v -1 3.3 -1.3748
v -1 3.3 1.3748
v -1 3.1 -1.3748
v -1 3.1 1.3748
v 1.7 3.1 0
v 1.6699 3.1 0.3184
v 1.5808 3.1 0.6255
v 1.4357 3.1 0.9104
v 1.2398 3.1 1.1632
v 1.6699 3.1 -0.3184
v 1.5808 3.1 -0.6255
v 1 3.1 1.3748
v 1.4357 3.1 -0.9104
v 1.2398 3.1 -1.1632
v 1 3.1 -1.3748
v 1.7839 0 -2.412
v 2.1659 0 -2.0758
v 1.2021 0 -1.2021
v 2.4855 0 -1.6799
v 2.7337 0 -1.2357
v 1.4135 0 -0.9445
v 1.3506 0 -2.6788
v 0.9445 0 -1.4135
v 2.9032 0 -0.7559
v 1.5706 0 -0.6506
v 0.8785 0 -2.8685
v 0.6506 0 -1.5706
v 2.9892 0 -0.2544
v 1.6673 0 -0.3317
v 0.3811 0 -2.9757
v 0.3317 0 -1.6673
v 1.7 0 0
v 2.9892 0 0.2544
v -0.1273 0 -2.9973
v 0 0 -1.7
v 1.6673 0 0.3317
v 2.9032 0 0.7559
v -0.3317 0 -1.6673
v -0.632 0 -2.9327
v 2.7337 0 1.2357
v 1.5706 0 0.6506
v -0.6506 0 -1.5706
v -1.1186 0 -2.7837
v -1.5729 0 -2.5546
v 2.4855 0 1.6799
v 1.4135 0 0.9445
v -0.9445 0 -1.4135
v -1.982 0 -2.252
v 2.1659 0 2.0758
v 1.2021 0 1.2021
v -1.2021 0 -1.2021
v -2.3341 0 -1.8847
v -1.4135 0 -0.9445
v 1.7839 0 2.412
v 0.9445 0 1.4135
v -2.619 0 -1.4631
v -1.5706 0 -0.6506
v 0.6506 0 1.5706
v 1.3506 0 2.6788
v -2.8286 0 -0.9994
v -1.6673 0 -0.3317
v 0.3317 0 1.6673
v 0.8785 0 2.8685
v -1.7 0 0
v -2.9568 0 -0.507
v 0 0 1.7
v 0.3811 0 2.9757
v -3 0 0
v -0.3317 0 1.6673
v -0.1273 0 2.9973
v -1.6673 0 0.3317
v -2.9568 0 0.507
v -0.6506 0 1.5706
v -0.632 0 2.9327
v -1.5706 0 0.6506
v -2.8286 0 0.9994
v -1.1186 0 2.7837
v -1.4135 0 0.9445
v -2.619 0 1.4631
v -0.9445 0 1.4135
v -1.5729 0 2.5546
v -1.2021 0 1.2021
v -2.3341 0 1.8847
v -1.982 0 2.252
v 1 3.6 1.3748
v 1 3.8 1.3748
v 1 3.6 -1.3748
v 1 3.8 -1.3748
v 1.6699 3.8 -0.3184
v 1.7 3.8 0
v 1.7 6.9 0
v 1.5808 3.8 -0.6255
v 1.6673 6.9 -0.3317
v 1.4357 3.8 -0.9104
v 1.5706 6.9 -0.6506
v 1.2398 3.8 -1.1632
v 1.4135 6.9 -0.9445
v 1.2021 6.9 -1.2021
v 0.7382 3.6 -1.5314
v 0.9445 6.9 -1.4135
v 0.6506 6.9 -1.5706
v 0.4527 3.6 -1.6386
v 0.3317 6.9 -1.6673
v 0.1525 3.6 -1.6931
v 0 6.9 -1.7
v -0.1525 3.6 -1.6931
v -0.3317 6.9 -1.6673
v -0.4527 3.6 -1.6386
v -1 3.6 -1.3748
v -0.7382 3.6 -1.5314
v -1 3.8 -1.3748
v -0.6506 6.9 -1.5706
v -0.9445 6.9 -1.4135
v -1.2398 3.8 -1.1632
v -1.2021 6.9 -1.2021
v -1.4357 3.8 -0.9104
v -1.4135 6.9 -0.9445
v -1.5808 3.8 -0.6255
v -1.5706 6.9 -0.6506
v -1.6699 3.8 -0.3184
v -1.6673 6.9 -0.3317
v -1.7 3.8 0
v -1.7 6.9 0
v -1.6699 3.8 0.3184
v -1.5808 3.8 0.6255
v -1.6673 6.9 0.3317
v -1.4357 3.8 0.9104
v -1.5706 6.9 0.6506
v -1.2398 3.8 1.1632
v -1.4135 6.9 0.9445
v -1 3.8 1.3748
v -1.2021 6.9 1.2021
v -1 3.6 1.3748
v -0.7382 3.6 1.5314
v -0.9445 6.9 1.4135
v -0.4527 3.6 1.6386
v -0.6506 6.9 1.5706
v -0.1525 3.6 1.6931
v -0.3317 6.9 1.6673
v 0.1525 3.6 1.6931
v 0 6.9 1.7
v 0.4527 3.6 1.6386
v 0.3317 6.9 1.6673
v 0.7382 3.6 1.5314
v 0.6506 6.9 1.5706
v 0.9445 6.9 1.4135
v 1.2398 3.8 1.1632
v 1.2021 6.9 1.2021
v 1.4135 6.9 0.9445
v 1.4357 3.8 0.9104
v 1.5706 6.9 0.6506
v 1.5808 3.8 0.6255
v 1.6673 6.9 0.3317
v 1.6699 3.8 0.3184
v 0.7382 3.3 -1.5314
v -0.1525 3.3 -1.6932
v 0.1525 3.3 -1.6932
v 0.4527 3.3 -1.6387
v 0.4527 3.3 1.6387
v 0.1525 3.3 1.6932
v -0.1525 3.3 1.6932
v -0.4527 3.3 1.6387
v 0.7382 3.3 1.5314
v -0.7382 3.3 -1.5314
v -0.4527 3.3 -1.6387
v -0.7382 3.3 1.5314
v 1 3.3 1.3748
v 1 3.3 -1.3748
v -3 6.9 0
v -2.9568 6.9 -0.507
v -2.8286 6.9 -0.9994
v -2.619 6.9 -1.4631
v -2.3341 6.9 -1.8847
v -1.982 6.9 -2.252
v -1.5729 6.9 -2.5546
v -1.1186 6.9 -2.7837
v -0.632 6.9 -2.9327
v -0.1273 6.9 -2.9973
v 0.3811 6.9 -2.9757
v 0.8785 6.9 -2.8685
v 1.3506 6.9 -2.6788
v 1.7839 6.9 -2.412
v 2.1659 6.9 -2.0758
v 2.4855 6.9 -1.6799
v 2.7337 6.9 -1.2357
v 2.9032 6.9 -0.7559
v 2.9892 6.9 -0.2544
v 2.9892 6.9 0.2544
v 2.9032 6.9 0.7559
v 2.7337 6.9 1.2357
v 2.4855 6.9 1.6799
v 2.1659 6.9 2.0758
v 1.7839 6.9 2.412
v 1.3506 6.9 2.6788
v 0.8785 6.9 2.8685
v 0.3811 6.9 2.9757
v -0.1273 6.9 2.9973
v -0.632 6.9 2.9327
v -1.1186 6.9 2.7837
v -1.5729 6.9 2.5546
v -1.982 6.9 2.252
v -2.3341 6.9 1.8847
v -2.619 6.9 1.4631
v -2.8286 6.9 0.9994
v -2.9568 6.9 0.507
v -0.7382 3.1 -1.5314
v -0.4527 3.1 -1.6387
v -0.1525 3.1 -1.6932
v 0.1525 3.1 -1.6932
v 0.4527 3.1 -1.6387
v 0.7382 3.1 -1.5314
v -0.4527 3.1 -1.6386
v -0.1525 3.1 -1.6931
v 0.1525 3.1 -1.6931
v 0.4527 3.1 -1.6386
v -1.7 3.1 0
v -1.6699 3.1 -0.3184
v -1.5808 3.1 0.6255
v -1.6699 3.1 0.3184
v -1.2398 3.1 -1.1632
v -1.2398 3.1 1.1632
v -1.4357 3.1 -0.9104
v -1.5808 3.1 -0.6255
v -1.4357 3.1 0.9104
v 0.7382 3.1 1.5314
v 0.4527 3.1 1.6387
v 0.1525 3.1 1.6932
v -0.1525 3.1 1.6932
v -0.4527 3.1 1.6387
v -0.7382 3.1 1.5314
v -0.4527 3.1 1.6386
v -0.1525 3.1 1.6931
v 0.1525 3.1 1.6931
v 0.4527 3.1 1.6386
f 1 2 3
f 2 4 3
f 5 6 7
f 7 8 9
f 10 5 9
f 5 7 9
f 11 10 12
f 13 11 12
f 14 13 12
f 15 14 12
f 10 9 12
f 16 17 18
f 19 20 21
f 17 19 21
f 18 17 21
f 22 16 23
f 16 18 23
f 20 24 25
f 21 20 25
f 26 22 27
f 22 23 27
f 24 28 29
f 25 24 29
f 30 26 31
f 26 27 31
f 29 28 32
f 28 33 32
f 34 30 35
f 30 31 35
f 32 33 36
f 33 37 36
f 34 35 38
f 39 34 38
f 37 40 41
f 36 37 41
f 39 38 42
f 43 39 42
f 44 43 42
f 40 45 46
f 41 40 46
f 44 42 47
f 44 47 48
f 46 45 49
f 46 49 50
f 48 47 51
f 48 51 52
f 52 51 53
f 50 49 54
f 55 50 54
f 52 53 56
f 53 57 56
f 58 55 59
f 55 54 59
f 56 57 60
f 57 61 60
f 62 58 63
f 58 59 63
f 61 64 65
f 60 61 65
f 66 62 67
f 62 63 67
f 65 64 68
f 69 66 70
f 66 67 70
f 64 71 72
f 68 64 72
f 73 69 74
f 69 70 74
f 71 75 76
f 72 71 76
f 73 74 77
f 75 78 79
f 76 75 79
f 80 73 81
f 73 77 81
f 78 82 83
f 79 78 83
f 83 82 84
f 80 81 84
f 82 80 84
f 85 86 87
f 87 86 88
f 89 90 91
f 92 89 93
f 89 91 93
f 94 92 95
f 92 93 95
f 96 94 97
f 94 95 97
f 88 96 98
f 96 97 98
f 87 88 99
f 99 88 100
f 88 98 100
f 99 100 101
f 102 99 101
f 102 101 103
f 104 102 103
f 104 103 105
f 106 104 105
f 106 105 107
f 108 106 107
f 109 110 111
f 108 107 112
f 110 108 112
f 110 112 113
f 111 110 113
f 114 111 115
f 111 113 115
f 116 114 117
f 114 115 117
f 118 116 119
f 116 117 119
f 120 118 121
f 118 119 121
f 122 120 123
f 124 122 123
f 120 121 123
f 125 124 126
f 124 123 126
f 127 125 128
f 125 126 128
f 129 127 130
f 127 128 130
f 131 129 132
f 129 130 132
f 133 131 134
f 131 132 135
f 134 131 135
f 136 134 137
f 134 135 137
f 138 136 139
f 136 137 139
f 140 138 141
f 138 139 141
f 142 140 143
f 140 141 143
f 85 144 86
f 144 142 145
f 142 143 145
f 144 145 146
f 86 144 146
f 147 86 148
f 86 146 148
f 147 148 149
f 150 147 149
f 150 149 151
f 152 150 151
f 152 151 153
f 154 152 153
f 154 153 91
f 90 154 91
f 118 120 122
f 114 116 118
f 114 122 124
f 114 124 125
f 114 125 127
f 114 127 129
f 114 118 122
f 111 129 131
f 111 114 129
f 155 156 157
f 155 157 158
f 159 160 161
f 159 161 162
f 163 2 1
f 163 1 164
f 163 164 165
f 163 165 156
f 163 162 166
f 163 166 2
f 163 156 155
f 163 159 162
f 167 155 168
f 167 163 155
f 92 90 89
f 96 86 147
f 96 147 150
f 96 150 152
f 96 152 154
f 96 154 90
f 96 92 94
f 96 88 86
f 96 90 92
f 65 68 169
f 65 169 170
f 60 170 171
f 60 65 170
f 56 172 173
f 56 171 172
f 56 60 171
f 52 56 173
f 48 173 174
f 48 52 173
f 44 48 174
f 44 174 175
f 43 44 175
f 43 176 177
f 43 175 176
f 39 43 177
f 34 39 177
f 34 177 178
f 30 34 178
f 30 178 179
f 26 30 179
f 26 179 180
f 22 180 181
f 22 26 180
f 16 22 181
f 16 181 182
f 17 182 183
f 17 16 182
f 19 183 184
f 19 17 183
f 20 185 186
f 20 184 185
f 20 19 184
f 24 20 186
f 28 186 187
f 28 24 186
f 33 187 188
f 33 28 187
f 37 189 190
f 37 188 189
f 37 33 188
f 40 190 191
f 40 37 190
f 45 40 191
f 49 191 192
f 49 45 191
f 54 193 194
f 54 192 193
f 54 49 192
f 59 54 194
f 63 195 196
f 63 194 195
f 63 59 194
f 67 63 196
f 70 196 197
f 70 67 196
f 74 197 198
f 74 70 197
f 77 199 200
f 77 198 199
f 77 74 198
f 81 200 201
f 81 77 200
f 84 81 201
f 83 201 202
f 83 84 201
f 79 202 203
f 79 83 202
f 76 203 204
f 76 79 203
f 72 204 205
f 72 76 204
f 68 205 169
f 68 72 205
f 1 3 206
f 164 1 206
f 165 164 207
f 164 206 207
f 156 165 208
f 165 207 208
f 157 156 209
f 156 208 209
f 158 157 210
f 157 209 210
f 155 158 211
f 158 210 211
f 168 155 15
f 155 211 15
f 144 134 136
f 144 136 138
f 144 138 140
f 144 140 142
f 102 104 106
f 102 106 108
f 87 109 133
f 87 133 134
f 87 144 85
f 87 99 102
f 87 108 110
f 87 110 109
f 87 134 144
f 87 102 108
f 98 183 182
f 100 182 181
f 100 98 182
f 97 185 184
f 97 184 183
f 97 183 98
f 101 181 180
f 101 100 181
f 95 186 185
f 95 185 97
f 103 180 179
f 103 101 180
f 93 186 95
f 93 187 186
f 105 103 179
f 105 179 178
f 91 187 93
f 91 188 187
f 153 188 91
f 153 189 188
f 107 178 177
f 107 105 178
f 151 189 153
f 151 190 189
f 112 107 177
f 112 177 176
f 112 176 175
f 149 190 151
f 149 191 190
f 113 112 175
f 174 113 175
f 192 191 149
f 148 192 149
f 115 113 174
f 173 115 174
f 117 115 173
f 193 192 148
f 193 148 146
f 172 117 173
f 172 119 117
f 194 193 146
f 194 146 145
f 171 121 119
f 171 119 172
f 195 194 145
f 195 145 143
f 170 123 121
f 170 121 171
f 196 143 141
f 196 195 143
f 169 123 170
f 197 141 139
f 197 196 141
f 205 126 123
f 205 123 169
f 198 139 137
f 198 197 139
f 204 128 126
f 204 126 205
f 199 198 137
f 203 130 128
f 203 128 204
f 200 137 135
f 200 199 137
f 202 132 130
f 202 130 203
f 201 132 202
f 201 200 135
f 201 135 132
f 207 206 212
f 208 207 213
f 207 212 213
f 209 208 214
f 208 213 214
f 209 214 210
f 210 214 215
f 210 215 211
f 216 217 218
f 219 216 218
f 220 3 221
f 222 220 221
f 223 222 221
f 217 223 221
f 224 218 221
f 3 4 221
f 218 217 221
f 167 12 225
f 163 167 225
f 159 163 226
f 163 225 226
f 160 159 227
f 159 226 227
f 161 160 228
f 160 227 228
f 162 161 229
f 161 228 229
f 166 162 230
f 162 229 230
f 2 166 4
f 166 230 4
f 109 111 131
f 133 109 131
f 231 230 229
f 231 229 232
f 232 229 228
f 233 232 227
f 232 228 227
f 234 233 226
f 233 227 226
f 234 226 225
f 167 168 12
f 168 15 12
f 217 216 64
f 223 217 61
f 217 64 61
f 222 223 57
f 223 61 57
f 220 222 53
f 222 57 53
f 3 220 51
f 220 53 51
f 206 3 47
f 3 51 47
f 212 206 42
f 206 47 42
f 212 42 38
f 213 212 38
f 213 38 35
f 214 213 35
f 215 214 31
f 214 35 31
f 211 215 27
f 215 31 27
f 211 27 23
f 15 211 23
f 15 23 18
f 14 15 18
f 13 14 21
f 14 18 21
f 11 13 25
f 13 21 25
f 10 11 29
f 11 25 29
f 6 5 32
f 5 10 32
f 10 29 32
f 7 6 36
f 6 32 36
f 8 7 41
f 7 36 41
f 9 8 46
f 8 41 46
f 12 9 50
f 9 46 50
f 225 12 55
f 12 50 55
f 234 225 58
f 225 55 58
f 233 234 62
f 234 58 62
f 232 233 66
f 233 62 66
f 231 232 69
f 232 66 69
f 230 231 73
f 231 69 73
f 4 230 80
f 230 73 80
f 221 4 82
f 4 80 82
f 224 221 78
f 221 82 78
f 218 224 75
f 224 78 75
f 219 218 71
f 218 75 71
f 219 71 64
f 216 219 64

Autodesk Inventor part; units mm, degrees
ref_plane "YZ Plane" through (0, 0, 0) normal (1, 0, 0) x (0, 1, 0)
ref_plane "XZ Plane" through (0, 0, 0) normal (0, 1, 0) x (-1, 0, 0)
ref_plane "XY Plane" through (0, 0, 0) normal (0, 0, 1) x (1, 0, 0)
sketch "Sketch1" plane through (0, 0, 0) normal (0, 1, 0) x (-1, 0, 0)
  circle A0 centre (0, 0) radius 3
  circle A1 centre (0, 0) radius 1.7
  dimension "d0" = 6
  dimension "d3" = 3.4
extrude "Extrusion1" add sketch "Sketch1" along normal blind 6.9 contours A0 | A1
extrude "Extrusion2" cut sketch "Sketch1" along normal blind 3.1 contours A1
sketch "Sketch2" plane through (0, 6.9, 0) normal (0, 1, 0) x (1, 0, 0)
  circle A0 centre (0, 0) radius 1.7 projected
extrude "Extrusion3" cut sketch "Sketch2" against normal blind 3.1
sketch "Sketch3" plane through (0, 3.8, 0) normal (0, 1, 0) x (1, 0, 0)
  line L0 (1, 2) -> (-1, 2)
  line L1 (-1, 2) -> (-1, -2)
  line L2 (-1, -2) -> (1, -2)
  line L3 (1, -2) -> (1, 2)
  line L4 (1, 2) -> (-1, -2) construction
  line L5 (-1, 2) -> (1, -2) construction
  circle A0 centre (0, 0) radius 1.7 projected
  point P0 (1, -1.3748)
  point P1 (1, 1.3748)
  point P2 (-1, 1.3748)
  point P3 (-1, -1.3748)
  dimension "d8" = 2
extrude "Extrusion4" cut sketch "Sketch3" against normal blind 0.2 contours L3 A0 L1
sketch "Sketch4" plane through (0, 3.1, 0) normal (0, -1, 0) x (1, 0, 0)
  line L0 (1, -1.3748) -> (1, 1.3748) projected
  arc A0 (-1, -1.3748) -> (1, -1.3748) centre (0, 0) ccw projected
  line L1 (-1, 1.3748) -> (-1, -1.3748) projected
  arc A1 (1, 1.3748) -> (-1, 1.3748) centre (0, 0) ccw projected
extrude "Extrusion5" cut sketch "Sketch4" against normal blind 0.2
properties part number "Printed Standoff 6.9mm"
